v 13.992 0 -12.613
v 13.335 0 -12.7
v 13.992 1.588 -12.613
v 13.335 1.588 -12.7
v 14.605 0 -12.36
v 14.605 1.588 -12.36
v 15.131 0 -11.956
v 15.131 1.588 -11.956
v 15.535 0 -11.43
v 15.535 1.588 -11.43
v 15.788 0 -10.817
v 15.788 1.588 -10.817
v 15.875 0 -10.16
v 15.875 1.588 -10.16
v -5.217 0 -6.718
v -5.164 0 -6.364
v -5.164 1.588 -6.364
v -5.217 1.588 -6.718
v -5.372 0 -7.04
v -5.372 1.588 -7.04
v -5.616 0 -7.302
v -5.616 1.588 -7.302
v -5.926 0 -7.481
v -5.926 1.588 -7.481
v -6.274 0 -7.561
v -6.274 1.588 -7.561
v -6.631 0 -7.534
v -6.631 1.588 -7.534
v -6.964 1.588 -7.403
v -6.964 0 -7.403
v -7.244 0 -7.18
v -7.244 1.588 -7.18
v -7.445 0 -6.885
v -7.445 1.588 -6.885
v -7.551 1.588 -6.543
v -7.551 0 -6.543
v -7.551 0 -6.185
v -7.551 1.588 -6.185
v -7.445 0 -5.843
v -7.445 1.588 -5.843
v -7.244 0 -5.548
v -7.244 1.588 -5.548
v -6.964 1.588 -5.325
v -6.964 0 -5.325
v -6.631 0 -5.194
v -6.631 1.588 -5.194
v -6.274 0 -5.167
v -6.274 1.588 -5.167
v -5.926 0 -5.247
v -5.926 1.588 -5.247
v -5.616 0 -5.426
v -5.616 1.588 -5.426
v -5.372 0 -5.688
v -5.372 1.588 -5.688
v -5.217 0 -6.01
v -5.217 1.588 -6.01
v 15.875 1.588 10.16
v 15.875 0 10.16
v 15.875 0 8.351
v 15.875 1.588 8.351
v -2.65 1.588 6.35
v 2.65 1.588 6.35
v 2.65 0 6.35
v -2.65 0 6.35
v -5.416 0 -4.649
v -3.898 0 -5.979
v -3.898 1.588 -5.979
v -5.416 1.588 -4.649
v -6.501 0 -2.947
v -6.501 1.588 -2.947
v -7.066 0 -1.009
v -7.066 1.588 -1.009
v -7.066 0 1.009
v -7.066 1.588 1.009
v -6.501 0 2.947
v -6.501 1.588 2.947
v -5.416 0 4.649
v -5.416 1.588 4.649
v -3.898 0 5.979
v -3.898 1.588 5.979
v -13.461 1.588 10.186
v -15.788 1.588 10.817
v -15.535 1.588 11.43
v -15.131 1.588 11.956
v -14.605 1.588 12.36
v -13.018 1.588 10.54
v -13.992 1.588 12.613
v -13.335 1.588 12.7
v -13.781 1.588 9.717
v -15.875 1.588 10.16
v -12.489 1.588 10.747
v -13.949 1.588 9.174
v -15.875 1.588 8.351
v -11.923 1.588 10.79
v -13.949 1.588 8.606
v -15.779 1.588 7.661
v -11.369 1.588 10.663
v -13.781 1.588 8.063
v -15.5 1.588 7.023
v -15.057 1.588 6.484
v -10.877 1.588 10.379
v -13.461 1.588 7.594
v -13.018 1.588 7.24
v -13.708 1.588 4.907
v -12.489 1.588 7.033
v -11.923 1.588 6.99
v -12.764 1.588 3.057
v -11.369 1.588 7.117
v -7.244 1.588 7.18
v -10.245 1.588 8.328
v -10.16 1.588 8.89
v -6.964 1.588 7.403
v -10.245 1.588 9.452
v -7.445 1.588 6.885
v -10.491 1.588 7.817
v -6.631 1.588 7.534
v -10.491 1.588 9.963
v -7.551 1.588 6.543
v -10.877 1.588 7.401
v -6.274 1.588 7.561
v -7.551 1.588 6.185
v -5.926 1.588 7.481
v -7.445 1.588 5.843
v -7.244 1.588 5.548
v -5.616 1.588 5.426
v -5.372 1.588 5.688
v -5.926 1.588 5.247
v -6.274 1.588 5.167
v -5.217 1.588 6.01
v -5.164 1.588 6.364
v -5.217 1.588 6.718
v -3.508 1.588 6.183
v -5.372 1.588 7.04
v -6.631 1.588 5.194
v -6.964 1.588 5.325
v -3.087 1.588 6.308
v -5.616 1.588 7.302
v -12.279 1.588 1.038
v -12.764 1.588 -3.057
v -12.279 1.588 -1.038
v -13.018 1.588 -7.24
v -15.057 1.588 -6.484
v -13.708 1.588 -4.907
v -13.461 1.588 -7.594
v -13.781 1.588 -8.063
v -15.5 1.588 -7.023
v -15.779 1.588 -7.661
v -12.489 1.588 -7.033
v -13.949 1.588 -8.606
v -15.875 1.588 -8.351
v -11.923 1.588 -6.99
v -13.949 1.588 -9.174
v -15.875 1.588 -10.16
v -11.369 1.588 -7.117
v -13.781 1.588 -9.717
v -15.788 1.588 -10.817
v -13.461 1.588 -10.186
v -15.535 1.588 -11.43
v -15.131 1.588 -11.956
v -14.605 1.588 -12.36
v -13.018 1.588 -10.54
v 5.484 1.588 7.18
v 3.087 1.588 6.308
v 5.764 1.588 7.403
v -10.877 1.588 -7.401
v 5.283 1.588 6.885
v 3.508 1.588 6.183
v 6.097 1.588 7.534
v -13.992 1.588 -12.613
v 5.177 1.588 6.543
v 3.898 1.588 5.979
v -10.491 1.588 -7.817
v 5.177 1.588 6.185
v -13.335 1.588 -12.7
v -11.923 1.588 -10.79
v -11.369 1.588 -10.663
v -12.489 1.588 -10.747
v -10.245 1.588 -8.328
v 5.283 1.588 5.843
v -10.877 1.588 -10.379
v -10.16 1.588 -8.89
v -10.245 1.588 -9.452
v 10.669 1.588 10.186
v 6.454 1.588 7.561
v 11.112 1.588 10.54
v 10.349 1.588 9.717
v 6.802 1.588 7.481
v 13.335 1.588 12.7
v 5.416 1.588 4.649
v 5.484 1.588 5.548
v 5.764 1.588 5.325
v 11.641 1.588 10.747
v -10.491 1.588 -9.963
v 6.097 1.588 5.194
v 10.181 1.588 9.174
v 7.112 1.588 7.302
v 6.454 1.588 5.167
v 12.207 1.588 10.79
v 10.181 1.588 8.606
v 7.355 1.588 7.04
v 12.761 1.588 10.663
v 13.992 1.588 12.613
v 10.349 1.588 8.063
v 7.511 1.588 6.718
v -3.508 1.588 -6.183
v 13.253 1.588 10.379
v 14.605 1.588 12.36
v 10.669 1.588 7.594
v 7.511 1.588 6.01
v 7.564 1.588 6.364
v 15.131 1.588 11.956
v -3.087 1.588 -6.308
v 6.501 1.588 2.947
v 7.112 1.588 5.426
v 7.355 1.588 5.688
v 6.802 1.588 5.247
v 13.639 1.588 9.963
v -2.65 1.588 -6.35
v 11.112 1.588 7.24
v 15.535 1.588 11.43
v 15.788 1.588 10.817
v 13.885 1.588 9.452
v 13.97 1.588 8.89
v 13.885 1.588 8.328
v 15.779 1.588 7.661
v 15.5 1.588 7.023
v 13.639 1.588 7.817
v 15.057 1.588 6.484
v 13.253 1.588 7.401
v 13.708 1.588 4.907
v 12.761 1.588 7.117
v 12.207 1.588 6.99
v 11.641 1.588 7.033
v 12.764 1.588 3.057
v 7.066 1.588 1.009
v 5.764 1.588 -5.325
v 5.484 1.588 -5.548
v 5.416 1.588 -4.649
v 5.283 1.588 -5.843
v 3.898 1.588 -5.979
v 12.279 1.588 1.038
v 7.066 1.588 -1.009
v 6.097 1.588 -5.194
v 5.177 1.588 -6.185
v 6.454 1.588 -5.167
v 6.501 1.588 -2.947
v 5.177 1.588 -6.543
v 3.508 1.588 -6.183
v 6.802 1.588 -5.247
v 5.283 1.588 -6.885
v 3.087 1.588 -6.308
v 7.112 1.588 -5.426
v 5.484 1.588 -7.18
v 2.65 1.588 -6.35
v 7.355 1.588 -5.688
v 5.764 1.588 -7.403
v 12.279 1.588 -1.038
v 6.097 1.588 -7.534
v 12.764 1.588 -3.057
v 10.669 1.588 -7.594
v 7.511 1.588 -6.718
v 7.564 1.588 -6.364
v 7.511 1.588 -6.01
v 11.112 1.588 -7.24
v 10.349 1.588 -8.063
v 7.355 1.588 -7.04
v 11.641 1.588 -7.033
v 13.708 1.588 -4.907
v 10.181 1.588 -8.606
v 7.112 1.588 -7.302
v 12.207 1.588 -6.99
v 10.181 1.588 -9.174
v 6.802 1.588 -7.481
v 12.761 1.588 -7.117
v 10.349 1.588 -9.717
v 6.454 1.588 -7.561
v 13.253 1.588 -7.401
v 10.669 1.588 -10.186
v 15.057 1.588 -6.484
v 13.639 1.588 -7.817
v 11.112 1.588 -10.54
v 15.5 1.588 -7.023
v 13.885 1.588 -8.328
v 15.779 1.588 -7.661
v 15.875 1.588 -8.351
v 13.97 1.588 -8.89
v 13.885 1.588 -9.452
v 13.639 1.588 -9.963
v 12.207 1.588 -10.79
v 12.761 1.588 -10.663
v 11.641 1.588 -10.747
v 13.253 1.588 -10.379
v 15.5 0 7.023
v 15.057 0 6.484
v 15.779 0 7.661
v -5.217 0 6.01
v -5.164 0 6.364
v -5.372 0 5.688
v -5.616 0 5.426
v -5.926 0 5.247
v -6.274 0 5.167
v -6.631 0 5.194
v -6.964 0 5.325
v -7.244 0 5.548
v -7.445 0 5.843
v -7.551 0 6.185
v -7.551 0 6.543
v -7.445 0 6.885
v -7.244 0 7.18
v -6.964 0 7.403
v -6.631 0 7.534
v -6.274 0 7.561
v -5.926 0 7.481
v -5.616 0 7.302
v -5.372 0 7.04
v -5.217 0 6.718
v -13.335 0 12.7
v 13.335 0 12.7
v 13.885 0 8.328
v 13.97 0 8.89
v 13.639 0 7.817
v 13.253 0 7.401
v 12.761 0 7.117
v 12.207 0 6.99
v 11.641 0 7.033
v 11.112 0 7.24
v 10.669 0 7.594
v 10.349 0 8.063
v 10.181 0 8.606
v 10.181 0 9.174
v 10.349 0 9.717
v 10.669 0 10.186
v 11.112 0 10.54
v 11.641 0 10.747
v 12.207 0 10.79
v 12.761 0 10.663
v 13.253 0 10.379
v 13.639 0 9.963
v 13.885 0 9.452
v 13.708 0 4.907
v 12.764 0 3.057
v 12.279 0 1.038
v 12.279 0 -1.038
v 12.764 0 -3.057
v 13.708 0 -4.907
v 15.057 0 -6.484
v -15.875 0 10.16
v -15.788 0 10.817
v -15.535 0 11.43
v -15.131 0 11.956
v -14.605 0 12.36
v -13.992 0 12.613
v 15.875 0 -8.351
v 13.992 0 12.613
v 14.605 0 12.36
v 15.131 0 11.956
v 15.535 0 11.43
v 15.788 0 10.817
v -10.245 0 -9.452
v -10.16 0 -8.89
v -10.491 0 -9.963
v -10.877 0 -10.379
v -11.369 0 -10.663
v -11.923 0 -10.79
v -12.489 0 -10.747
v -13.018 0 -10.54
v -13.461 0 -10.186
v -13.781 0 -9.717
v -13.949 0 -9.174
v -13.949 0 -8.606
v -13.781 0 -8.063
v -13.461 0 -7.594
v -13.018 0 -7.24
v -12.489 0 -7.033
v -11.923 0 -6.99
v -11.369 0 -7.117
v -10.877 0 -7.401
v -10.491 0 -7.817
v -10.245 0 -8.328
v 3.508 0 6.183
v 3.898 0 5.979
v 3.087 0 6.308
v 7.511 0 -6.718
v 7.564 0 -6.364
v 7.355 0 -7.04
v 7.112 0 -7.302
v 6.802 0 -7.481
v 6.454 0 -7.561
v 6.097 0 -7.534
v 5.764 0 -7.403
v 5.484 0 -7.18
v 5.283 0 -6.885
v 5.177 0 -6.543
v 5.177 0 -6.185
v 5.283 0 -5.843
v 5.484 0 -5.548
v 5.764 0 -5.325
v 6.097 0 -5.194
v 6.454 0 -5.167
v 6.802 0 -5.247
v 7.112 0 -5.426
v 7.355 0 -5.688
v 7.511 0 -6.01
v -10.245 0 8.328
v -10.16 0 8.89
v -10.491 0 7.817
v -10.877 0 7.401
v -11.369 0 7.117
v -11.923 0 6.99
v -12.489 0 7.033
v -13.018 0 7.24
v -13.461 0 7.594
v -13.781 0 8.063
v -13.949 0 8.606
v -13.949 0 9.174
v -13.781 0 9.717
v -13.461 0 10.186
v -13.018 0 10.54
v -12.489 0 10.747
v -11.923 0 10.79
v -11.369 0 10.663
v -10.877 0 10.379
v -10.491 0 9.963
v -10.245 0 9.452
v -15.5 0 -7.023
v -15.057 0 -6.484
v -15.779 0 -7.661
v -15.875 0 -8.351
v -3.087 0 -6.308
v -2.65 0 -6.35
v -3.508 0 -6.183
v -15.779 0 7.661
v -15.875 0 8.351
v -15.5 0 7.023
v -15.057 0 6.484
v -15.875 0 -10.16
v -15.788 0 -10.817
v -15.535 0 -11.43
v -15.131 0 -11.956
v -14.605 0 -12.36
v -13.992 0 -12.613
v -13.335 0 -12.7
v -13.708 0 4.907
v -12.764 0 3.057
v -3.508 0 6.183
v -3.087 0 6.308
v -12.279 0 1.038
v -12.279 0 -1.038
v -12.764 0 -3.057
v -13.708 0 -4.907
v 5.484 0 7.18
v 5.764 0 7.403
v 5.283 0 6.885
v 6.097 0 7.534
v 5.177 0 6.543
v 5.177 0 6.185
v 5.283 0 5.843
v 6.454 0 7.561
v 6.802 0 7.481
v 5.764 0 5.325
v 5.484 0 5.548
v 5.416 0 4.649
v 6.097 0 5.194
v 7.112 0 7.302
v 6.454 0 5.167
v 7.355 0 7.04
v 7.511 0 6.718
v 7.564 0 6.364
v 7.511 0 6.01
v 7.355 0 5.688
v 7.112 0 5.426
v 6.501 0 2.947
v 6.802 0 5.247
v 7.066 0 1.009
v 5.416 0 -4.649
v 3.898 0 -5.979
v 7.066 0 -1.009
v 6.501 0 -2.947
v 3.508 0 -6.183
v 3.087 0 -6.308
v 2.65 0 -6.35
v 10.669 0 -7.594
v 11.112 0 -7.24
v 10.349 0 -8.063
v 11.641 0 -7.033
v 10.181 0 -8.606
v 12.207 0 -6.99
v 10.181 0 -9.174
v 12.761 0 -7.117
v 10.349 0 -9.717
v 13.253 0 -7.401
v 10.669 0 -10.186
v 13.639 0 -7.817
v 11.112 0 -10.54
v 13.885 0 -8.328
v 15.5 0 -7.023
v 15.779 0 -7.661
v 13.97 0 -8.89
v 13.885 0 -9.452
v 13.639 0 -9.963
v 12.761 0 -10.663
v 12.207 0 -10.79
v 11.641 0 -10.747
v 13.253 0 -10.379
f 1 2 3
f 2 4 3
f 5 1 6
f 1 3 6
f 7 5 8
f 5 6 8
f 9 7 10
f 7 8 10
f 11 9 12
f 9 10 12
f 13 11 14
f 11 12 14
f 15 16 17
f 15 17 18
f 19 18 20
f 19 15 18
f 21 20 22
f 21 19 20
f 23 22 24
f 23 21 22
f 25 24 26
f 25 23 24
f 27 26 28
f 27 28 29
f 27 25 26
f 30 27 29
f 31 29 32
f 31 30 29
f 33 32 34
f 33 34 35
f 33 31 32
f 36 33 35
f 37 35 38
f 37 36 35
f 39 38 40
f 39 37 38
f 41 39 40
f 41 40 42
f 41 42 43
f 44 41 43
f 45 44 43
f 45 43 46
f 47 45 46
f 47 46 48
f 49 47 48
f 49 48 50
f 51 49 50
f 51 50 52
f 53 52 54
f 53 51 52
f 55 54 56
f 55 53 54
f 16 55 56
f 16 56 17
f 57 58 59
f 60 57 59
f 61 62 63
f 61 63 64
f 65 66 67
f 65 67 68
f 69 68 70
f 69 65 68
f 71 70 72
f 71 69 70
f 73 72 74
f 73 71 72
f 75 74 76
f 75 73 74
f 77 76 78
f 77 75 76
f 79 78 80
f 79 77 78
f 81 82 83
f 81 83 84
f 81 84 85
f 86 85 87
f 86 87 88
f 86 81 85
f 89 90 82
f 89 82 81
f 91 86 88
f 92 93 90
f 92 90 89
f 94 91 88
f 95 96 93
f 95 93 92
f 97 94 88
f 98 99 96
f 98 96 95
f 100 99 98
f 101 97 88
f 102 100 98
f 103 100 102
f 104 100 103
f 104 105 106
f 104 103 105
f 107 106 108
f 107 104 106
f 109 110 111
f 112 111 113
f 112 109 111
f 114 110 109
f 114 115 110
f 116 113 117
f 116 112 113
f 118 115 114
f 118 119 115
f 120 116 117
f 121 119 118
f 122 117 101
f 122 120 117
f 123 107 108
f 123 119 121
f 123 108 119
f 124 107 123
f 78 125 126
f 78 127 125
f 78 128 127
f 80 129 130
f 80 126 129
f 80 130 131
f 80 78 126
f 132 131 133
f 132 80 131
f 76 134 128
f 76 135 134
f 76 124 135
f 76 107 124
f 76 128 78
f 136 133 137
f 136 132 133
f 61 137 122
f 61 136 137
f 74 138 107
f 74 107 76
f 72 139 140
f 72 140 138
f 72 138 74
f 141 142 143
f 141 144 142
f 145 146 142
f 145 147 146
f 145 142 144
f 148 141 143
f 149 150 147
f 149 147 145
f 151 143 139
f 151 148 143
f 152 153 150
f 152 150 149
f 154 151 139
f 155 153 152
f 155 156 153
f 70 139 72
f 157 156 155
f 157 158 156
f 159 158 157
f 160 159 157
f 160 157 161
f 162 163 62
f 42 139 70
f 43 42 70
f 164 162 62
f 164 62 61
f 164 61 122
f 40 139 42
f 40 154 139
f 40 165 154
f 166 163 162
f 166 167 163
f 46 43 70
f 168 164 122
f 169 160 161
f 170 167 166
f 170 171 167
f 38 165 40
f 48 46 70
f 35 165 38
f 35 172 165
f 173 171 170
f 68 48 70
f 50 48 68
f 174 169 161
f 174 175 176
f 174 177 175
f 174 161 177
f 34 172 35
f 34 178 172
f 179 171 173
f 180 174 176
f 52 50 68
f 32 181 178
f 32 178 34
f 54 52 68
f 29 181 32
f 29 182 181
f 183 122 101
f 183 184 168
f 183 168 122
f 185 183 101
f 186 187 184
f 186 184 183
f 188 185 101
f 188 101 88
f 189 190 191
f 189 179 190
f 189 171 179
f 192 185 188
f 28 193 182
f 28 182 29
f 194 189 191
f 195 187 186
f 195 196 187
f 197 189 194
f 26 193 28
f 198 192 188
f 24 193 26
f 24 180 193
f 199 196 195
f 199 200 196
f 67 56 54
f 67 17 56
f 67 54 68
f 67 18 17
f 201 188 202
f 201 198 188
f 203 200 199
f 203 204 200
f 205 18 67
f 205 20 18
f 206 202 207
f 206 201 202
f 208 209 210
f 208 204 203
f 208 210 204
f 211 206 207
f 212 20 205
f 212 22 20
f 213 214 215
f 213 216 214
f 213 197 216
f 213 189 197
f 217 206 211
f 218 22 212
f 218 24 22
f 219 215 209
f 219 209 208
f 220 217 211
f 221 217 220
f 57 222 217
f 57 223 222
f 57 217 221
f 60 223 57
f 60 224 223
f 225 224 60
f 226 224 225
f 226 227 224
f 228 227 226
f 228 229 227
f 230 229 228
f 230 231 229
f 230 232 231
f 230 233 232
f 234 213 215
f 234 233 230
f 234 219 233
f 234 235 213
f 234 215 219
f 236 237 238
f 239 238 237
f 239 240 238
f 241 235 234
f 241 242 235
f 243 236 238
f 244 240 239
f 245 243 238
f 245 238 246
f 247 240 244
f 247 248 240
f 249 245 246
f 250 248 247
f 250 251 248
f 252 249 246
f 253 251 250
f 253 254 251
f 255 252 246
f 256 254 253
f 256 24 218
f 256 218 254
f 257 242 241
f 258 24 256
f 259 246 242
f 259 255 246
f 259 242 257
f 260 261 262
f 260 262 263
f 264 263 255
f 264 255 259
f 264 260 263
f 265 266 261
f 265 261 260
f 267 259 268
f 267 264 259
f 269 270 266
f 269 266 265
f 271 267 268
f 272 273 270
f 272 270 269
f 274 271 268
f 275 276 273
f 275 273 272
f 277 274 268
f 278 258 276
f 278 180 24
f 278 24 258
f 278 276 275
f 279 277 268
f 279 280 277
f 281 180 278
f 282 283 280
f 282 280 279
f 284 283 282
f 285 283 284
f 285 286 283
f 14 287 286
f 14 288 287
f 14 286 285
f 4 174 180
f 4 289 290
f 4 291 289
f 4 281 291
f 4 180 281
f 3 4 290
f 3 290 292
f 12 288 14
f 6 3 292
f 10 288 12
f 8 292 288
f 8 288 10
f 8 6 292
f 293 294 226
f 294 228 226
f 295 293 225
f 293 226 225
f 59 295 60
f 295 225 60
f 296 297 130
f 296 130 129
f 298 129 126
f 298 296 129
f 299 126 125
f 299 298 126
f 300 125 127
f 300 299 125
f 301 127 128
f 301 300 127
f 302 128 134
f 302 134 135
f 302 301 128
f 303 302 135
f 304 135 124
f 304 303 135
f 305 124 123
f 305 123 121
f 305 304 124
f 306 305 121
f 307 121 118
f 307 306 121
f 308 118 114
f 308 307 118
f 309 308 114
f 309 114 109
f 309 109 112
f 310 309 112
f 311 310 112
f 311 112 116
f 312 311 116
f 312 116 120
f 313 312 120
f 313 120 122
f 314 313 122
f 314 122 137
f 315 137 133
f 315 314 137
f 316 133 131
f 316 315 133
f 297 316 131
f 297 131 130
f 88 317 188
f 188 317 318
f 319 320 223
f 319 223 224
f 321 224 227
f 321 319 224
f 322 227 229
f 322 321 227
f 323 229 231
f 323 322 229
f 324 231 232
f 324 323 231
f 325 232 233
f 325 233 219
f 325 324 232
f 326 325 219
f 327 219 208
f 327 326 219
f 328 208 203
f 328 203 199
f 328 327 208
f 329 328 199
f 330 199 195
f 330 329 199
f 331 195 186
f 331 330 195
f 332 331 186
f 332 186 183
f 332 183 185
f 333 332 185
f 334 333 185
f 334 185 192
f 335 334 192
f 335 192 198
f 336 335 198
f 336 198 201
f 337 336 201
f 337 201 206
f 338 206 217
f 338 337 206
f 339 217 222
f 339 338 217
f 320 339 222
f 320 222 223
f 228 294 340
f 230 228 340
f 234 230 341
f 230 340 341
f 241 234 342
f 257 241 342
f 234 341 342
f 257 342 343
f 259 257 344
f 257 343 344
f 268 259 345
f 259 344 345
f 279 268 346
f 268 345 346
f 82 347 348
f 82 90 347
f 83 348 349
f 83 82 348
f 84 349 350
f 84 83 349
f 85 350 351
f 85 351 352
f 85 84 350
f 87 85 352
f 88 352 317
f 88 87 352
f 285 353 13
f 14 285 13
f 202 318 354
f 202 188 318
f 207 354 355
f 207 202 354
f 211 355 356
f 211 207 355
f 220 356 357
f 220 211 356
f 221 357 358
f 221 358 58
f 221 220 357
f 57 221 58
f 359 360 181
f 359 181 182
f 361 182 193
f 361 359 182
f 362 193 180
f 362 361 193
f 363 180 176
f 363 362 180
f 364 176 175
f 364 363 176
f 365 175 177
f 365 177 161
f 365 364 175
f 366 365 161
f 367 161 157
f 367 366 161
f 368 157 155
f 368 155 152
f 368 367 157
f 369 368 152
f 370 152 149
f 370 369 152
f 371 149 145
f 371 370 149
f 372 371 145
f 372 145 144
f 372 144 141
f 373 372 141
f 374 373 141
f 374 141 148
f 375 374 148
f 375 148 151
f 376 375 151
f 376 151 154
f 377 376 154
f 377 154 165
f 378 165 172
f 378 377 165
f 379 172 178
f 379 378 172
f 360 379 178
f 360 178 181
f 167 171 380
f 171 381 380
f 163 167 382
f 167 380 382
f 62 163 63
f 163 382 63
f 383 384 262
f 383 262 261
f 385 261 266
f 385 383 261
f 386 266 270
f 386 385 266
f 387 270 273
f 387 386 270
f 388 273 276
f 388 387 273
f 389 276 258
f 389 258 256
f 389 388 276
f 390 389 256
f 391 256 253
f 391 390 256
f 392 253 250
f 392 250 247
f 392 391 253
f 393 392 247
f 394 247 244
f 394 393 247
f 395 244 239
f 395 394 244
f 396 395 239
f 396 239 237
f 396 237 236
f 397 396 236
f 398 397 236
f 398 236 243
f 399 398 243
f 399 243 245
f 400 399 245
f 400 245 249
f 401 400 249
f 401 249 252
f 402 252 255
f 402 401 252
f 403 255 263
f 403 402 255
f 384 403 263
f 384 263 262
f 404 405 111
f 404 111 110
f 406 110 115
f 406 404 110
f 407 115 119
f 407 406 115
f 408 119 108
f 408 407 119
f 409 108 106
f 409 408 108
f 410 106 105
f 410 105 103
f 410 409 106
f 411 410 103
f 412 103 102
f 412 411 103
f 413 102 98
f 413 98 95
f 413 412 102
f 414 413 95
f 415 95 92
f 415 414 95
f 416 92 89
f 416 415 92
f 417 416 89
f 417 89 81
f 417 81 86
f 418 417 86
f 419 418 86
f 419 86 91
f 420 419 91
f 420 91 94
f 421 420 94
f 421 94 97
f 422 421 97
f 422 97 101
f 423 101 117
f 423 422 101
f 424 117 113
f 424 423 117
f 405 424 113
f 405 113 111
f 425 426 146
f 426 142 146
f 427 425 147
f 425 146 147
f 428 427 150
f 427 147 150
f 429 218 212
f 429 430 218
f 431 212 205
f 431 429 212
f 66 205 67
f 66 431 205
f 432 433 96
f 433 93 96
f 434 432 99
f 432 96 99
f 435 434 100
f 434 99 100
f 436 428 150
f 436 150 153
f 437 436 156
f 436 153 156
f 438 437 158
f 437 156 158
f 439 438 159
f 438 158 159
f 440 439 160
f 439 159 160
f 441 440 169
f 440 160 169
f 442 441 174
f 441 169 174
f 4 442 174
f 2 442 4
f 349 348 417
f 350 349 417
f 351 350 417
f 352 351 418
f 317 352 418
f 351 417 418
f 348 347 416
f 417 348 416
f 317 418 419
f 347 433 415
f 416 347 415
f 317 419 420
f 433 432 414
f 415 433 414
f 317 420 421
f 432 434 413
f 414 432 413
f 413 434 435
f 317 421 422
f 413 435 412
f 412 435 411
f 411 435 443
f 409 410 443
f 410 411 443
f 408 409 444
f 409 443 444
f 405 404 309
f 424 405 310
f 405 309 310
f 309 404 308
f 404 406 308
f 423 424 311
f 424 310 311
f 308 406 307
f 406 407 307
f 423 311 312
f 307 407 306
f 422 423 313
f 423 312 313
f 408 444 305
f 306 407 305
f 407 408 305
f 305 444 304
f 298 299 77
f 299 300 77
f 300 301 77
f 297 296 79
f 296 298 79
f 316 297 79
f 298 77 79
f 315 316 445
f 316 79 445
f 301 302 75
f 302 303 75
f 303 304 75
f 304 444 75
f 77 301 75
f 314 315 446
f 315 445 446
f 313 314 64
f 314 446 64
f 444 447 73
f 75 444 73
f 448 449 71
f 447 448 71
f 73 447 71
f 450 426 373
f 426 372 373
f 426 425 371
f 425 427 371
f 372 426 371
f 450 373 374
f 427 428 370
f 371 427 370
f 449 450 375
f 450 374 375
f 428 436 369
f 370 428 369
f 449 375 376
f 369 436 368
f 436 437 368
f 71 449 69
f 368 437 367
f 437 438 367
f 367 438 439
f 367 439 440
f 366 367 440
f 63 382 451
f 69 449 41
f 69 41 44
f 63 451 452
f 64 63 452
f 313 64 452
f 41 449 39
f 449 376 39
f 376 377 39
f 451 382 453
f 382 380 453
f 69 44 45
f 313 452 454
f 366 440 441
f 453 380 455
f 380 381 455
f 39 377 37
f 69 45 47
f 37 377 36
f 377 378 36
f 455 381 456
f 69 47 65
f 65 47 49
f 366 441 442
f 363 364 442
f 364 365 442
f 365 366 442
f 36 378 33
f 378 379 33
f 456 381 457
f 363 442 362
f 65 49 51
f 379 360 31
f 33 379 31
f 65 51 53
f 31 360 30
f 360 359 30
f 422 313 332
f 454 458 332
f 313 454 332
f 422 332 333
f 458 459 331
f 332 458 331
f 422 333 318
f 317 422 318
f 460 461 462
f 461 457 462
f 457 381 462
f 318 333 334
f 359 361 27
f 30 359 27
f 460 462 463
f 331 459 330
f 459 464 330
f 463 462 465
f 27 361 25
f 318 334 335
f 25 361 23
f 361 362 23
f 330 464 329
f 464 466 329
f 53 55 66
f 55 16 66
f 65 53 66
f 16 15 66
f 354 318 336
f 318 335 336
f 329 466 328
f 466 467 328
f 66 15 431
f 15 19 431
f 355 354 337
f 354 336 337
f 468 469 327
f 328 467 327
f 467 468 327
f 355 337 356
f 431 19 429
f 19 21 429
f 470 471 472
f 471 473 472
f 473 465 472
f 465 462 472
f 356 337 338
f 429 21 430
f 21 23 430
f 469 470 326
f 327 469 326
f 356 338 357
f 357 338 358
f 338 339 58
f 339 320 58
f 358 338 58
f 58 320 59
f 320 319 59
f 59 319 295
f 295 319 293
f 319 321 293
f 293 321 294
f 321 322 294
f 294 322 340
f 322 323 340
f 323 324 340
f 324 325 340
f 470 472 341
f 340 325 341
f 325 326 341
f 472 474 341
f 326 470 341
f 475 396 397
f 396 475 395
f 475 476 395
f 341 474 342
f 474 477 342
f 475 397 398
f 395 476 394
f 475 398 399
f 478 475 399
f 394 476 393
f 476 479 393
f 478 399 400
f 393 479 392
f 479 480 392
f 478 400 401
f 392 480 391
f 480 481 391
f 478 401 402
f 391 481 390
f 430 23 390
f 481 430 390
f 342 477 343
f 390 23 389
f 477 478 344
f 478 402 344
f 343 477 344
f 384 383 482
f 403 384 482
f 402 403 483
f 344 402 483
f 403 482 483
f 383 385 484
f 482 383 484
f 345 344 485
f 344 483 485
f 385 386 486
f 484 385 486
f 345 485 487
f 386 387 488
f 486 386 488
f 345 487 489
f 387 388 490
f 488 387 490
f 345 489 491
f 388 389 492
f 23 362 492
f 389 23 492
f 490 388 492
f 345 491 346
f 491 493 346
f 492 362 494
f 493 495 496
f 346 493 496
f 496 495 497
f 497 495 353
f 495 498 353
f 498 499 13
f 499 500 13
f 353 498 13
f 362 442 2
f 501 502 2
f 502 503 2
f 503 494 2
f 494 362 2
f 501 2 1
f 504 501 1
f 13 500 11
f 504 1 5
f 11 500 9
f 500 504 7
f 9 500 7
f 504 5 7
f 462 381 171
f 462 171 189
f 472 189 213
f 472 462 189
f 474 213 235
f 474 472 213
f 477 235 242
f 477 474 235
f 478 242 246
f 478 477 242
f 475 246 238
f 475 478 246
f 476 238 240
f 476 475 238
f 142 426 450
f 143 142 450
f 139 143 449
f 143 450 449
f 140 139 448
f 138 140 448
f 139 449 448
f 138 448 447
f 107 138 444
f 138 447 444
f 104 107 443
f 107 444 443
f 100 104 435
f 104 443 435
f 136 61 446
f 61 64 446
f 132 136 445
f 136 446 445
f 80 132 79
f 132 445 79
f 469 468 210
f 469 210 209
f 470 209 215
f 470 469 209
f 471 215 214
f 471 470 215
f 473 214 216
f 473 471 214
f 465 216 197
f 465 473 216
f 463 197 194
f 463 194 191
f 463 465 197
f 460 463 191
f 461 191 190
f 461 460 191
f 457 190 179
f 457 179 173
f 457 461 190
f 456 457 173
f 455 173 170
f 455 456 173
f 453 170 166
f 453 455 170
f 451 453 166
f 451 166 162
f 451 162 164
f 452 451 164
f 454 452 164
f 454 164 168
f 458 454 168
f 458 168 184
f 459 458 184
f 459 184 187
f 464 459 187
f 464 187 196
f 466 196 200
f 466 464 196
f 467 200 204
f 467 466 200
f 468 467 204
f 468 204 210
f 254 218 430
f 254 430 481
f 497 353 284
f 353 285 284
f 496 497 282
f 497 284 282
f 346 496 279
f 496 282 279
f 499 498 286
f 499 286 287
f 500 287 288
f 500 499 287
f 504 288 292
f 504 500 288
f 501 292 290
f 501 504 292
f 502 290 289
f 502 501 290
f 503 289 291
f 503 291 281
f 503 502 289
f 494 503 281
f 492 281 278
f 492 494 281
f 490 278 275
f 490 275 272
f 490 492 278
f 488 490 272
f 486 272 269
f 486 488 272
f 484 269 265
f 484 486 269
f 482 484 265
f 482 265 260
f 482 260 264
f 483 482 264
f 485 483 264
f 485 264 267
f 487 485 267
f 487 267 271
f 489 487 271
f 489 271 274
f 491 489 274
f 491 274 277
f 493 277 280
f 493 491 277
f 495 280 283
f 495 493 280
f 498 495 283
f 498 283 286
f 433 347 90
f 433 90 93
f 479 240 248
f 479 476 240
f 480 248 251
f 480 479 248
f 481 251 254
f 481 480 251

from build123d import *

# Parameters (mm, degrees)
SKETCH1_W           = 31.75
SKETCH1_H           = 25.4
SKETCH1_R           = 7.1374
SKETCH1_R_2         = 1.2
SKETCH1_R_3         = 1.905
BOSS_EXTRUDE1_DEPTH = 1.5875
BOSS_EXTRUDE3_DEPTH = 1.5875
CUT_EXTRUDE1_DEPTH  = 2.5875
FILLET3_R           = 2.54
FILLET2_R           = 2.286


with BuildPart() as part:
    # Sketch1 → Boss-Extrude1 (new body)
    with BuildSketch(Plane(origin=(0, 0, 0), x_dir=(1, 0, 0), z_dir=(0, 1, 0))):
        Rectangle(SKETCH1_W, SKETCH1_H)
        Circle(SKETCH1_R, mode=Mode.SUBTRACT)
        with Locations((-6.363961031, -6.363961031)):
            Circle(SKETCH1_R_2, mode=Mode.SUBTRACT)
        with Locations((-6.363961031, 6.363961031)):
            Circle(SKETCH1_R_2, mode=Mode.SUBTRACT)
        with Locations((6.363961031, 6.363961031)):
            Circle(SKETCH1_R_2, mode=Mode.SUBTRACT)
        with Locations((6.363961031, -6.363961031)):
            Circle(SKETCH1_R_2, mode=Mode.SUBTRACT)
        with Locations((-12.065, -8.89)):
            Circle(SKETCH1_R_3, mode=Mode.SUBTRACT)
        with Locations((-12.065, 8.89)):
            Circle(SKETCH1_R_3, mode=Mode.SUBTRACT)
        with Locations((12.065, 8.89)):
            Circle(SKETCH1_R_3, mode=Mode.SUBTRACT)
        with Locations((12.065, -8.89)):
            Circle(SKETCH1_R_3, mode=Mode.SUBTRACT)
    extrude(amount=BOSS_EXTRUDE1_DEPTH)

    # Sketch3 → Boss-Extrude3 (add, through all)
    with BuildSketch(Plane(origin=(0, 1.5875, 0), x_dir=(1, 0, 0), z_dir=(0, 1, 0))):
        with BuildLine():
            Line((-3.258830889, 6.35), (3.258830889, 6.35))
            ThreePointArc((3.258830889, 6.35), (0, 7.1374), (-3.258830889, 6.35))
        make_face()
        with BuildLine():
            Line((3.258830889, -6.35), (-3.258830889, -6.35))
            ThreePointArc((-3.258830889, -6.35), (0, -7.1374), (3.258830889, -6.35))
        make_face()
    extrude(amount=-BOSS_EXTRUDE3_DEPTH)

    # Sketch4 → Cut-Extrude1 (cut, through all)
    with BuildSketch(Plane.XZ):
        with BuildLine():
            Line((-15.875, 7.152704943), (-15.875, -7.152704943))
            ThreePointArc((-15.875, -7.152704943), (-12.2174, 0), (-15.875, 7.152704943))
        make_face()
        with BuildLine():
            Line((15.875, -7.152704943), (15.875, 7.152704943))
            ThreePointArc((15.875, 7.152704943), (12.2174, 0), (15.875, -7.152704943))
        make_face()
    extrude(amount=-CUT_EXTRUDE1_DEPTH, mode=Mode.SUBTRACT)

    # Fillet3
    fillet3_edges = [part.edges().sort_by_distance(p)[0] for p in [
        (-15.875, 0.79375, 7.152704943),
        (-15.875, 0.79375, -7.152704943),
        (15.875, 0.79375, 12.7),
        (-15.875, 0.79375, 12.7),
        (15.875, 0.79375, -7.152704943),
        (-15.875, 0.79375, -12.7),
        (15.875, 0.79375, 7.152704943),
        (15.875, 0.79375, -12.7),
    ]]
    fillet(fillet3_edges, radius=FILLET3_R)

    # Fillet2
    fillet2_edges = [part.edges().sort_by_distance(p)[0] for p in [
        (-3.258830889, 0.79375, -6.35),
        (3.258830889, 0.79375, -6.35),
        (3.258830889, 0.79375, 6.35),
        (-3.258830889, 0.79375, 6.35),
    ]]
    fillet(fillet2_edges, radius=FILLET2_R)


solid = part.part
